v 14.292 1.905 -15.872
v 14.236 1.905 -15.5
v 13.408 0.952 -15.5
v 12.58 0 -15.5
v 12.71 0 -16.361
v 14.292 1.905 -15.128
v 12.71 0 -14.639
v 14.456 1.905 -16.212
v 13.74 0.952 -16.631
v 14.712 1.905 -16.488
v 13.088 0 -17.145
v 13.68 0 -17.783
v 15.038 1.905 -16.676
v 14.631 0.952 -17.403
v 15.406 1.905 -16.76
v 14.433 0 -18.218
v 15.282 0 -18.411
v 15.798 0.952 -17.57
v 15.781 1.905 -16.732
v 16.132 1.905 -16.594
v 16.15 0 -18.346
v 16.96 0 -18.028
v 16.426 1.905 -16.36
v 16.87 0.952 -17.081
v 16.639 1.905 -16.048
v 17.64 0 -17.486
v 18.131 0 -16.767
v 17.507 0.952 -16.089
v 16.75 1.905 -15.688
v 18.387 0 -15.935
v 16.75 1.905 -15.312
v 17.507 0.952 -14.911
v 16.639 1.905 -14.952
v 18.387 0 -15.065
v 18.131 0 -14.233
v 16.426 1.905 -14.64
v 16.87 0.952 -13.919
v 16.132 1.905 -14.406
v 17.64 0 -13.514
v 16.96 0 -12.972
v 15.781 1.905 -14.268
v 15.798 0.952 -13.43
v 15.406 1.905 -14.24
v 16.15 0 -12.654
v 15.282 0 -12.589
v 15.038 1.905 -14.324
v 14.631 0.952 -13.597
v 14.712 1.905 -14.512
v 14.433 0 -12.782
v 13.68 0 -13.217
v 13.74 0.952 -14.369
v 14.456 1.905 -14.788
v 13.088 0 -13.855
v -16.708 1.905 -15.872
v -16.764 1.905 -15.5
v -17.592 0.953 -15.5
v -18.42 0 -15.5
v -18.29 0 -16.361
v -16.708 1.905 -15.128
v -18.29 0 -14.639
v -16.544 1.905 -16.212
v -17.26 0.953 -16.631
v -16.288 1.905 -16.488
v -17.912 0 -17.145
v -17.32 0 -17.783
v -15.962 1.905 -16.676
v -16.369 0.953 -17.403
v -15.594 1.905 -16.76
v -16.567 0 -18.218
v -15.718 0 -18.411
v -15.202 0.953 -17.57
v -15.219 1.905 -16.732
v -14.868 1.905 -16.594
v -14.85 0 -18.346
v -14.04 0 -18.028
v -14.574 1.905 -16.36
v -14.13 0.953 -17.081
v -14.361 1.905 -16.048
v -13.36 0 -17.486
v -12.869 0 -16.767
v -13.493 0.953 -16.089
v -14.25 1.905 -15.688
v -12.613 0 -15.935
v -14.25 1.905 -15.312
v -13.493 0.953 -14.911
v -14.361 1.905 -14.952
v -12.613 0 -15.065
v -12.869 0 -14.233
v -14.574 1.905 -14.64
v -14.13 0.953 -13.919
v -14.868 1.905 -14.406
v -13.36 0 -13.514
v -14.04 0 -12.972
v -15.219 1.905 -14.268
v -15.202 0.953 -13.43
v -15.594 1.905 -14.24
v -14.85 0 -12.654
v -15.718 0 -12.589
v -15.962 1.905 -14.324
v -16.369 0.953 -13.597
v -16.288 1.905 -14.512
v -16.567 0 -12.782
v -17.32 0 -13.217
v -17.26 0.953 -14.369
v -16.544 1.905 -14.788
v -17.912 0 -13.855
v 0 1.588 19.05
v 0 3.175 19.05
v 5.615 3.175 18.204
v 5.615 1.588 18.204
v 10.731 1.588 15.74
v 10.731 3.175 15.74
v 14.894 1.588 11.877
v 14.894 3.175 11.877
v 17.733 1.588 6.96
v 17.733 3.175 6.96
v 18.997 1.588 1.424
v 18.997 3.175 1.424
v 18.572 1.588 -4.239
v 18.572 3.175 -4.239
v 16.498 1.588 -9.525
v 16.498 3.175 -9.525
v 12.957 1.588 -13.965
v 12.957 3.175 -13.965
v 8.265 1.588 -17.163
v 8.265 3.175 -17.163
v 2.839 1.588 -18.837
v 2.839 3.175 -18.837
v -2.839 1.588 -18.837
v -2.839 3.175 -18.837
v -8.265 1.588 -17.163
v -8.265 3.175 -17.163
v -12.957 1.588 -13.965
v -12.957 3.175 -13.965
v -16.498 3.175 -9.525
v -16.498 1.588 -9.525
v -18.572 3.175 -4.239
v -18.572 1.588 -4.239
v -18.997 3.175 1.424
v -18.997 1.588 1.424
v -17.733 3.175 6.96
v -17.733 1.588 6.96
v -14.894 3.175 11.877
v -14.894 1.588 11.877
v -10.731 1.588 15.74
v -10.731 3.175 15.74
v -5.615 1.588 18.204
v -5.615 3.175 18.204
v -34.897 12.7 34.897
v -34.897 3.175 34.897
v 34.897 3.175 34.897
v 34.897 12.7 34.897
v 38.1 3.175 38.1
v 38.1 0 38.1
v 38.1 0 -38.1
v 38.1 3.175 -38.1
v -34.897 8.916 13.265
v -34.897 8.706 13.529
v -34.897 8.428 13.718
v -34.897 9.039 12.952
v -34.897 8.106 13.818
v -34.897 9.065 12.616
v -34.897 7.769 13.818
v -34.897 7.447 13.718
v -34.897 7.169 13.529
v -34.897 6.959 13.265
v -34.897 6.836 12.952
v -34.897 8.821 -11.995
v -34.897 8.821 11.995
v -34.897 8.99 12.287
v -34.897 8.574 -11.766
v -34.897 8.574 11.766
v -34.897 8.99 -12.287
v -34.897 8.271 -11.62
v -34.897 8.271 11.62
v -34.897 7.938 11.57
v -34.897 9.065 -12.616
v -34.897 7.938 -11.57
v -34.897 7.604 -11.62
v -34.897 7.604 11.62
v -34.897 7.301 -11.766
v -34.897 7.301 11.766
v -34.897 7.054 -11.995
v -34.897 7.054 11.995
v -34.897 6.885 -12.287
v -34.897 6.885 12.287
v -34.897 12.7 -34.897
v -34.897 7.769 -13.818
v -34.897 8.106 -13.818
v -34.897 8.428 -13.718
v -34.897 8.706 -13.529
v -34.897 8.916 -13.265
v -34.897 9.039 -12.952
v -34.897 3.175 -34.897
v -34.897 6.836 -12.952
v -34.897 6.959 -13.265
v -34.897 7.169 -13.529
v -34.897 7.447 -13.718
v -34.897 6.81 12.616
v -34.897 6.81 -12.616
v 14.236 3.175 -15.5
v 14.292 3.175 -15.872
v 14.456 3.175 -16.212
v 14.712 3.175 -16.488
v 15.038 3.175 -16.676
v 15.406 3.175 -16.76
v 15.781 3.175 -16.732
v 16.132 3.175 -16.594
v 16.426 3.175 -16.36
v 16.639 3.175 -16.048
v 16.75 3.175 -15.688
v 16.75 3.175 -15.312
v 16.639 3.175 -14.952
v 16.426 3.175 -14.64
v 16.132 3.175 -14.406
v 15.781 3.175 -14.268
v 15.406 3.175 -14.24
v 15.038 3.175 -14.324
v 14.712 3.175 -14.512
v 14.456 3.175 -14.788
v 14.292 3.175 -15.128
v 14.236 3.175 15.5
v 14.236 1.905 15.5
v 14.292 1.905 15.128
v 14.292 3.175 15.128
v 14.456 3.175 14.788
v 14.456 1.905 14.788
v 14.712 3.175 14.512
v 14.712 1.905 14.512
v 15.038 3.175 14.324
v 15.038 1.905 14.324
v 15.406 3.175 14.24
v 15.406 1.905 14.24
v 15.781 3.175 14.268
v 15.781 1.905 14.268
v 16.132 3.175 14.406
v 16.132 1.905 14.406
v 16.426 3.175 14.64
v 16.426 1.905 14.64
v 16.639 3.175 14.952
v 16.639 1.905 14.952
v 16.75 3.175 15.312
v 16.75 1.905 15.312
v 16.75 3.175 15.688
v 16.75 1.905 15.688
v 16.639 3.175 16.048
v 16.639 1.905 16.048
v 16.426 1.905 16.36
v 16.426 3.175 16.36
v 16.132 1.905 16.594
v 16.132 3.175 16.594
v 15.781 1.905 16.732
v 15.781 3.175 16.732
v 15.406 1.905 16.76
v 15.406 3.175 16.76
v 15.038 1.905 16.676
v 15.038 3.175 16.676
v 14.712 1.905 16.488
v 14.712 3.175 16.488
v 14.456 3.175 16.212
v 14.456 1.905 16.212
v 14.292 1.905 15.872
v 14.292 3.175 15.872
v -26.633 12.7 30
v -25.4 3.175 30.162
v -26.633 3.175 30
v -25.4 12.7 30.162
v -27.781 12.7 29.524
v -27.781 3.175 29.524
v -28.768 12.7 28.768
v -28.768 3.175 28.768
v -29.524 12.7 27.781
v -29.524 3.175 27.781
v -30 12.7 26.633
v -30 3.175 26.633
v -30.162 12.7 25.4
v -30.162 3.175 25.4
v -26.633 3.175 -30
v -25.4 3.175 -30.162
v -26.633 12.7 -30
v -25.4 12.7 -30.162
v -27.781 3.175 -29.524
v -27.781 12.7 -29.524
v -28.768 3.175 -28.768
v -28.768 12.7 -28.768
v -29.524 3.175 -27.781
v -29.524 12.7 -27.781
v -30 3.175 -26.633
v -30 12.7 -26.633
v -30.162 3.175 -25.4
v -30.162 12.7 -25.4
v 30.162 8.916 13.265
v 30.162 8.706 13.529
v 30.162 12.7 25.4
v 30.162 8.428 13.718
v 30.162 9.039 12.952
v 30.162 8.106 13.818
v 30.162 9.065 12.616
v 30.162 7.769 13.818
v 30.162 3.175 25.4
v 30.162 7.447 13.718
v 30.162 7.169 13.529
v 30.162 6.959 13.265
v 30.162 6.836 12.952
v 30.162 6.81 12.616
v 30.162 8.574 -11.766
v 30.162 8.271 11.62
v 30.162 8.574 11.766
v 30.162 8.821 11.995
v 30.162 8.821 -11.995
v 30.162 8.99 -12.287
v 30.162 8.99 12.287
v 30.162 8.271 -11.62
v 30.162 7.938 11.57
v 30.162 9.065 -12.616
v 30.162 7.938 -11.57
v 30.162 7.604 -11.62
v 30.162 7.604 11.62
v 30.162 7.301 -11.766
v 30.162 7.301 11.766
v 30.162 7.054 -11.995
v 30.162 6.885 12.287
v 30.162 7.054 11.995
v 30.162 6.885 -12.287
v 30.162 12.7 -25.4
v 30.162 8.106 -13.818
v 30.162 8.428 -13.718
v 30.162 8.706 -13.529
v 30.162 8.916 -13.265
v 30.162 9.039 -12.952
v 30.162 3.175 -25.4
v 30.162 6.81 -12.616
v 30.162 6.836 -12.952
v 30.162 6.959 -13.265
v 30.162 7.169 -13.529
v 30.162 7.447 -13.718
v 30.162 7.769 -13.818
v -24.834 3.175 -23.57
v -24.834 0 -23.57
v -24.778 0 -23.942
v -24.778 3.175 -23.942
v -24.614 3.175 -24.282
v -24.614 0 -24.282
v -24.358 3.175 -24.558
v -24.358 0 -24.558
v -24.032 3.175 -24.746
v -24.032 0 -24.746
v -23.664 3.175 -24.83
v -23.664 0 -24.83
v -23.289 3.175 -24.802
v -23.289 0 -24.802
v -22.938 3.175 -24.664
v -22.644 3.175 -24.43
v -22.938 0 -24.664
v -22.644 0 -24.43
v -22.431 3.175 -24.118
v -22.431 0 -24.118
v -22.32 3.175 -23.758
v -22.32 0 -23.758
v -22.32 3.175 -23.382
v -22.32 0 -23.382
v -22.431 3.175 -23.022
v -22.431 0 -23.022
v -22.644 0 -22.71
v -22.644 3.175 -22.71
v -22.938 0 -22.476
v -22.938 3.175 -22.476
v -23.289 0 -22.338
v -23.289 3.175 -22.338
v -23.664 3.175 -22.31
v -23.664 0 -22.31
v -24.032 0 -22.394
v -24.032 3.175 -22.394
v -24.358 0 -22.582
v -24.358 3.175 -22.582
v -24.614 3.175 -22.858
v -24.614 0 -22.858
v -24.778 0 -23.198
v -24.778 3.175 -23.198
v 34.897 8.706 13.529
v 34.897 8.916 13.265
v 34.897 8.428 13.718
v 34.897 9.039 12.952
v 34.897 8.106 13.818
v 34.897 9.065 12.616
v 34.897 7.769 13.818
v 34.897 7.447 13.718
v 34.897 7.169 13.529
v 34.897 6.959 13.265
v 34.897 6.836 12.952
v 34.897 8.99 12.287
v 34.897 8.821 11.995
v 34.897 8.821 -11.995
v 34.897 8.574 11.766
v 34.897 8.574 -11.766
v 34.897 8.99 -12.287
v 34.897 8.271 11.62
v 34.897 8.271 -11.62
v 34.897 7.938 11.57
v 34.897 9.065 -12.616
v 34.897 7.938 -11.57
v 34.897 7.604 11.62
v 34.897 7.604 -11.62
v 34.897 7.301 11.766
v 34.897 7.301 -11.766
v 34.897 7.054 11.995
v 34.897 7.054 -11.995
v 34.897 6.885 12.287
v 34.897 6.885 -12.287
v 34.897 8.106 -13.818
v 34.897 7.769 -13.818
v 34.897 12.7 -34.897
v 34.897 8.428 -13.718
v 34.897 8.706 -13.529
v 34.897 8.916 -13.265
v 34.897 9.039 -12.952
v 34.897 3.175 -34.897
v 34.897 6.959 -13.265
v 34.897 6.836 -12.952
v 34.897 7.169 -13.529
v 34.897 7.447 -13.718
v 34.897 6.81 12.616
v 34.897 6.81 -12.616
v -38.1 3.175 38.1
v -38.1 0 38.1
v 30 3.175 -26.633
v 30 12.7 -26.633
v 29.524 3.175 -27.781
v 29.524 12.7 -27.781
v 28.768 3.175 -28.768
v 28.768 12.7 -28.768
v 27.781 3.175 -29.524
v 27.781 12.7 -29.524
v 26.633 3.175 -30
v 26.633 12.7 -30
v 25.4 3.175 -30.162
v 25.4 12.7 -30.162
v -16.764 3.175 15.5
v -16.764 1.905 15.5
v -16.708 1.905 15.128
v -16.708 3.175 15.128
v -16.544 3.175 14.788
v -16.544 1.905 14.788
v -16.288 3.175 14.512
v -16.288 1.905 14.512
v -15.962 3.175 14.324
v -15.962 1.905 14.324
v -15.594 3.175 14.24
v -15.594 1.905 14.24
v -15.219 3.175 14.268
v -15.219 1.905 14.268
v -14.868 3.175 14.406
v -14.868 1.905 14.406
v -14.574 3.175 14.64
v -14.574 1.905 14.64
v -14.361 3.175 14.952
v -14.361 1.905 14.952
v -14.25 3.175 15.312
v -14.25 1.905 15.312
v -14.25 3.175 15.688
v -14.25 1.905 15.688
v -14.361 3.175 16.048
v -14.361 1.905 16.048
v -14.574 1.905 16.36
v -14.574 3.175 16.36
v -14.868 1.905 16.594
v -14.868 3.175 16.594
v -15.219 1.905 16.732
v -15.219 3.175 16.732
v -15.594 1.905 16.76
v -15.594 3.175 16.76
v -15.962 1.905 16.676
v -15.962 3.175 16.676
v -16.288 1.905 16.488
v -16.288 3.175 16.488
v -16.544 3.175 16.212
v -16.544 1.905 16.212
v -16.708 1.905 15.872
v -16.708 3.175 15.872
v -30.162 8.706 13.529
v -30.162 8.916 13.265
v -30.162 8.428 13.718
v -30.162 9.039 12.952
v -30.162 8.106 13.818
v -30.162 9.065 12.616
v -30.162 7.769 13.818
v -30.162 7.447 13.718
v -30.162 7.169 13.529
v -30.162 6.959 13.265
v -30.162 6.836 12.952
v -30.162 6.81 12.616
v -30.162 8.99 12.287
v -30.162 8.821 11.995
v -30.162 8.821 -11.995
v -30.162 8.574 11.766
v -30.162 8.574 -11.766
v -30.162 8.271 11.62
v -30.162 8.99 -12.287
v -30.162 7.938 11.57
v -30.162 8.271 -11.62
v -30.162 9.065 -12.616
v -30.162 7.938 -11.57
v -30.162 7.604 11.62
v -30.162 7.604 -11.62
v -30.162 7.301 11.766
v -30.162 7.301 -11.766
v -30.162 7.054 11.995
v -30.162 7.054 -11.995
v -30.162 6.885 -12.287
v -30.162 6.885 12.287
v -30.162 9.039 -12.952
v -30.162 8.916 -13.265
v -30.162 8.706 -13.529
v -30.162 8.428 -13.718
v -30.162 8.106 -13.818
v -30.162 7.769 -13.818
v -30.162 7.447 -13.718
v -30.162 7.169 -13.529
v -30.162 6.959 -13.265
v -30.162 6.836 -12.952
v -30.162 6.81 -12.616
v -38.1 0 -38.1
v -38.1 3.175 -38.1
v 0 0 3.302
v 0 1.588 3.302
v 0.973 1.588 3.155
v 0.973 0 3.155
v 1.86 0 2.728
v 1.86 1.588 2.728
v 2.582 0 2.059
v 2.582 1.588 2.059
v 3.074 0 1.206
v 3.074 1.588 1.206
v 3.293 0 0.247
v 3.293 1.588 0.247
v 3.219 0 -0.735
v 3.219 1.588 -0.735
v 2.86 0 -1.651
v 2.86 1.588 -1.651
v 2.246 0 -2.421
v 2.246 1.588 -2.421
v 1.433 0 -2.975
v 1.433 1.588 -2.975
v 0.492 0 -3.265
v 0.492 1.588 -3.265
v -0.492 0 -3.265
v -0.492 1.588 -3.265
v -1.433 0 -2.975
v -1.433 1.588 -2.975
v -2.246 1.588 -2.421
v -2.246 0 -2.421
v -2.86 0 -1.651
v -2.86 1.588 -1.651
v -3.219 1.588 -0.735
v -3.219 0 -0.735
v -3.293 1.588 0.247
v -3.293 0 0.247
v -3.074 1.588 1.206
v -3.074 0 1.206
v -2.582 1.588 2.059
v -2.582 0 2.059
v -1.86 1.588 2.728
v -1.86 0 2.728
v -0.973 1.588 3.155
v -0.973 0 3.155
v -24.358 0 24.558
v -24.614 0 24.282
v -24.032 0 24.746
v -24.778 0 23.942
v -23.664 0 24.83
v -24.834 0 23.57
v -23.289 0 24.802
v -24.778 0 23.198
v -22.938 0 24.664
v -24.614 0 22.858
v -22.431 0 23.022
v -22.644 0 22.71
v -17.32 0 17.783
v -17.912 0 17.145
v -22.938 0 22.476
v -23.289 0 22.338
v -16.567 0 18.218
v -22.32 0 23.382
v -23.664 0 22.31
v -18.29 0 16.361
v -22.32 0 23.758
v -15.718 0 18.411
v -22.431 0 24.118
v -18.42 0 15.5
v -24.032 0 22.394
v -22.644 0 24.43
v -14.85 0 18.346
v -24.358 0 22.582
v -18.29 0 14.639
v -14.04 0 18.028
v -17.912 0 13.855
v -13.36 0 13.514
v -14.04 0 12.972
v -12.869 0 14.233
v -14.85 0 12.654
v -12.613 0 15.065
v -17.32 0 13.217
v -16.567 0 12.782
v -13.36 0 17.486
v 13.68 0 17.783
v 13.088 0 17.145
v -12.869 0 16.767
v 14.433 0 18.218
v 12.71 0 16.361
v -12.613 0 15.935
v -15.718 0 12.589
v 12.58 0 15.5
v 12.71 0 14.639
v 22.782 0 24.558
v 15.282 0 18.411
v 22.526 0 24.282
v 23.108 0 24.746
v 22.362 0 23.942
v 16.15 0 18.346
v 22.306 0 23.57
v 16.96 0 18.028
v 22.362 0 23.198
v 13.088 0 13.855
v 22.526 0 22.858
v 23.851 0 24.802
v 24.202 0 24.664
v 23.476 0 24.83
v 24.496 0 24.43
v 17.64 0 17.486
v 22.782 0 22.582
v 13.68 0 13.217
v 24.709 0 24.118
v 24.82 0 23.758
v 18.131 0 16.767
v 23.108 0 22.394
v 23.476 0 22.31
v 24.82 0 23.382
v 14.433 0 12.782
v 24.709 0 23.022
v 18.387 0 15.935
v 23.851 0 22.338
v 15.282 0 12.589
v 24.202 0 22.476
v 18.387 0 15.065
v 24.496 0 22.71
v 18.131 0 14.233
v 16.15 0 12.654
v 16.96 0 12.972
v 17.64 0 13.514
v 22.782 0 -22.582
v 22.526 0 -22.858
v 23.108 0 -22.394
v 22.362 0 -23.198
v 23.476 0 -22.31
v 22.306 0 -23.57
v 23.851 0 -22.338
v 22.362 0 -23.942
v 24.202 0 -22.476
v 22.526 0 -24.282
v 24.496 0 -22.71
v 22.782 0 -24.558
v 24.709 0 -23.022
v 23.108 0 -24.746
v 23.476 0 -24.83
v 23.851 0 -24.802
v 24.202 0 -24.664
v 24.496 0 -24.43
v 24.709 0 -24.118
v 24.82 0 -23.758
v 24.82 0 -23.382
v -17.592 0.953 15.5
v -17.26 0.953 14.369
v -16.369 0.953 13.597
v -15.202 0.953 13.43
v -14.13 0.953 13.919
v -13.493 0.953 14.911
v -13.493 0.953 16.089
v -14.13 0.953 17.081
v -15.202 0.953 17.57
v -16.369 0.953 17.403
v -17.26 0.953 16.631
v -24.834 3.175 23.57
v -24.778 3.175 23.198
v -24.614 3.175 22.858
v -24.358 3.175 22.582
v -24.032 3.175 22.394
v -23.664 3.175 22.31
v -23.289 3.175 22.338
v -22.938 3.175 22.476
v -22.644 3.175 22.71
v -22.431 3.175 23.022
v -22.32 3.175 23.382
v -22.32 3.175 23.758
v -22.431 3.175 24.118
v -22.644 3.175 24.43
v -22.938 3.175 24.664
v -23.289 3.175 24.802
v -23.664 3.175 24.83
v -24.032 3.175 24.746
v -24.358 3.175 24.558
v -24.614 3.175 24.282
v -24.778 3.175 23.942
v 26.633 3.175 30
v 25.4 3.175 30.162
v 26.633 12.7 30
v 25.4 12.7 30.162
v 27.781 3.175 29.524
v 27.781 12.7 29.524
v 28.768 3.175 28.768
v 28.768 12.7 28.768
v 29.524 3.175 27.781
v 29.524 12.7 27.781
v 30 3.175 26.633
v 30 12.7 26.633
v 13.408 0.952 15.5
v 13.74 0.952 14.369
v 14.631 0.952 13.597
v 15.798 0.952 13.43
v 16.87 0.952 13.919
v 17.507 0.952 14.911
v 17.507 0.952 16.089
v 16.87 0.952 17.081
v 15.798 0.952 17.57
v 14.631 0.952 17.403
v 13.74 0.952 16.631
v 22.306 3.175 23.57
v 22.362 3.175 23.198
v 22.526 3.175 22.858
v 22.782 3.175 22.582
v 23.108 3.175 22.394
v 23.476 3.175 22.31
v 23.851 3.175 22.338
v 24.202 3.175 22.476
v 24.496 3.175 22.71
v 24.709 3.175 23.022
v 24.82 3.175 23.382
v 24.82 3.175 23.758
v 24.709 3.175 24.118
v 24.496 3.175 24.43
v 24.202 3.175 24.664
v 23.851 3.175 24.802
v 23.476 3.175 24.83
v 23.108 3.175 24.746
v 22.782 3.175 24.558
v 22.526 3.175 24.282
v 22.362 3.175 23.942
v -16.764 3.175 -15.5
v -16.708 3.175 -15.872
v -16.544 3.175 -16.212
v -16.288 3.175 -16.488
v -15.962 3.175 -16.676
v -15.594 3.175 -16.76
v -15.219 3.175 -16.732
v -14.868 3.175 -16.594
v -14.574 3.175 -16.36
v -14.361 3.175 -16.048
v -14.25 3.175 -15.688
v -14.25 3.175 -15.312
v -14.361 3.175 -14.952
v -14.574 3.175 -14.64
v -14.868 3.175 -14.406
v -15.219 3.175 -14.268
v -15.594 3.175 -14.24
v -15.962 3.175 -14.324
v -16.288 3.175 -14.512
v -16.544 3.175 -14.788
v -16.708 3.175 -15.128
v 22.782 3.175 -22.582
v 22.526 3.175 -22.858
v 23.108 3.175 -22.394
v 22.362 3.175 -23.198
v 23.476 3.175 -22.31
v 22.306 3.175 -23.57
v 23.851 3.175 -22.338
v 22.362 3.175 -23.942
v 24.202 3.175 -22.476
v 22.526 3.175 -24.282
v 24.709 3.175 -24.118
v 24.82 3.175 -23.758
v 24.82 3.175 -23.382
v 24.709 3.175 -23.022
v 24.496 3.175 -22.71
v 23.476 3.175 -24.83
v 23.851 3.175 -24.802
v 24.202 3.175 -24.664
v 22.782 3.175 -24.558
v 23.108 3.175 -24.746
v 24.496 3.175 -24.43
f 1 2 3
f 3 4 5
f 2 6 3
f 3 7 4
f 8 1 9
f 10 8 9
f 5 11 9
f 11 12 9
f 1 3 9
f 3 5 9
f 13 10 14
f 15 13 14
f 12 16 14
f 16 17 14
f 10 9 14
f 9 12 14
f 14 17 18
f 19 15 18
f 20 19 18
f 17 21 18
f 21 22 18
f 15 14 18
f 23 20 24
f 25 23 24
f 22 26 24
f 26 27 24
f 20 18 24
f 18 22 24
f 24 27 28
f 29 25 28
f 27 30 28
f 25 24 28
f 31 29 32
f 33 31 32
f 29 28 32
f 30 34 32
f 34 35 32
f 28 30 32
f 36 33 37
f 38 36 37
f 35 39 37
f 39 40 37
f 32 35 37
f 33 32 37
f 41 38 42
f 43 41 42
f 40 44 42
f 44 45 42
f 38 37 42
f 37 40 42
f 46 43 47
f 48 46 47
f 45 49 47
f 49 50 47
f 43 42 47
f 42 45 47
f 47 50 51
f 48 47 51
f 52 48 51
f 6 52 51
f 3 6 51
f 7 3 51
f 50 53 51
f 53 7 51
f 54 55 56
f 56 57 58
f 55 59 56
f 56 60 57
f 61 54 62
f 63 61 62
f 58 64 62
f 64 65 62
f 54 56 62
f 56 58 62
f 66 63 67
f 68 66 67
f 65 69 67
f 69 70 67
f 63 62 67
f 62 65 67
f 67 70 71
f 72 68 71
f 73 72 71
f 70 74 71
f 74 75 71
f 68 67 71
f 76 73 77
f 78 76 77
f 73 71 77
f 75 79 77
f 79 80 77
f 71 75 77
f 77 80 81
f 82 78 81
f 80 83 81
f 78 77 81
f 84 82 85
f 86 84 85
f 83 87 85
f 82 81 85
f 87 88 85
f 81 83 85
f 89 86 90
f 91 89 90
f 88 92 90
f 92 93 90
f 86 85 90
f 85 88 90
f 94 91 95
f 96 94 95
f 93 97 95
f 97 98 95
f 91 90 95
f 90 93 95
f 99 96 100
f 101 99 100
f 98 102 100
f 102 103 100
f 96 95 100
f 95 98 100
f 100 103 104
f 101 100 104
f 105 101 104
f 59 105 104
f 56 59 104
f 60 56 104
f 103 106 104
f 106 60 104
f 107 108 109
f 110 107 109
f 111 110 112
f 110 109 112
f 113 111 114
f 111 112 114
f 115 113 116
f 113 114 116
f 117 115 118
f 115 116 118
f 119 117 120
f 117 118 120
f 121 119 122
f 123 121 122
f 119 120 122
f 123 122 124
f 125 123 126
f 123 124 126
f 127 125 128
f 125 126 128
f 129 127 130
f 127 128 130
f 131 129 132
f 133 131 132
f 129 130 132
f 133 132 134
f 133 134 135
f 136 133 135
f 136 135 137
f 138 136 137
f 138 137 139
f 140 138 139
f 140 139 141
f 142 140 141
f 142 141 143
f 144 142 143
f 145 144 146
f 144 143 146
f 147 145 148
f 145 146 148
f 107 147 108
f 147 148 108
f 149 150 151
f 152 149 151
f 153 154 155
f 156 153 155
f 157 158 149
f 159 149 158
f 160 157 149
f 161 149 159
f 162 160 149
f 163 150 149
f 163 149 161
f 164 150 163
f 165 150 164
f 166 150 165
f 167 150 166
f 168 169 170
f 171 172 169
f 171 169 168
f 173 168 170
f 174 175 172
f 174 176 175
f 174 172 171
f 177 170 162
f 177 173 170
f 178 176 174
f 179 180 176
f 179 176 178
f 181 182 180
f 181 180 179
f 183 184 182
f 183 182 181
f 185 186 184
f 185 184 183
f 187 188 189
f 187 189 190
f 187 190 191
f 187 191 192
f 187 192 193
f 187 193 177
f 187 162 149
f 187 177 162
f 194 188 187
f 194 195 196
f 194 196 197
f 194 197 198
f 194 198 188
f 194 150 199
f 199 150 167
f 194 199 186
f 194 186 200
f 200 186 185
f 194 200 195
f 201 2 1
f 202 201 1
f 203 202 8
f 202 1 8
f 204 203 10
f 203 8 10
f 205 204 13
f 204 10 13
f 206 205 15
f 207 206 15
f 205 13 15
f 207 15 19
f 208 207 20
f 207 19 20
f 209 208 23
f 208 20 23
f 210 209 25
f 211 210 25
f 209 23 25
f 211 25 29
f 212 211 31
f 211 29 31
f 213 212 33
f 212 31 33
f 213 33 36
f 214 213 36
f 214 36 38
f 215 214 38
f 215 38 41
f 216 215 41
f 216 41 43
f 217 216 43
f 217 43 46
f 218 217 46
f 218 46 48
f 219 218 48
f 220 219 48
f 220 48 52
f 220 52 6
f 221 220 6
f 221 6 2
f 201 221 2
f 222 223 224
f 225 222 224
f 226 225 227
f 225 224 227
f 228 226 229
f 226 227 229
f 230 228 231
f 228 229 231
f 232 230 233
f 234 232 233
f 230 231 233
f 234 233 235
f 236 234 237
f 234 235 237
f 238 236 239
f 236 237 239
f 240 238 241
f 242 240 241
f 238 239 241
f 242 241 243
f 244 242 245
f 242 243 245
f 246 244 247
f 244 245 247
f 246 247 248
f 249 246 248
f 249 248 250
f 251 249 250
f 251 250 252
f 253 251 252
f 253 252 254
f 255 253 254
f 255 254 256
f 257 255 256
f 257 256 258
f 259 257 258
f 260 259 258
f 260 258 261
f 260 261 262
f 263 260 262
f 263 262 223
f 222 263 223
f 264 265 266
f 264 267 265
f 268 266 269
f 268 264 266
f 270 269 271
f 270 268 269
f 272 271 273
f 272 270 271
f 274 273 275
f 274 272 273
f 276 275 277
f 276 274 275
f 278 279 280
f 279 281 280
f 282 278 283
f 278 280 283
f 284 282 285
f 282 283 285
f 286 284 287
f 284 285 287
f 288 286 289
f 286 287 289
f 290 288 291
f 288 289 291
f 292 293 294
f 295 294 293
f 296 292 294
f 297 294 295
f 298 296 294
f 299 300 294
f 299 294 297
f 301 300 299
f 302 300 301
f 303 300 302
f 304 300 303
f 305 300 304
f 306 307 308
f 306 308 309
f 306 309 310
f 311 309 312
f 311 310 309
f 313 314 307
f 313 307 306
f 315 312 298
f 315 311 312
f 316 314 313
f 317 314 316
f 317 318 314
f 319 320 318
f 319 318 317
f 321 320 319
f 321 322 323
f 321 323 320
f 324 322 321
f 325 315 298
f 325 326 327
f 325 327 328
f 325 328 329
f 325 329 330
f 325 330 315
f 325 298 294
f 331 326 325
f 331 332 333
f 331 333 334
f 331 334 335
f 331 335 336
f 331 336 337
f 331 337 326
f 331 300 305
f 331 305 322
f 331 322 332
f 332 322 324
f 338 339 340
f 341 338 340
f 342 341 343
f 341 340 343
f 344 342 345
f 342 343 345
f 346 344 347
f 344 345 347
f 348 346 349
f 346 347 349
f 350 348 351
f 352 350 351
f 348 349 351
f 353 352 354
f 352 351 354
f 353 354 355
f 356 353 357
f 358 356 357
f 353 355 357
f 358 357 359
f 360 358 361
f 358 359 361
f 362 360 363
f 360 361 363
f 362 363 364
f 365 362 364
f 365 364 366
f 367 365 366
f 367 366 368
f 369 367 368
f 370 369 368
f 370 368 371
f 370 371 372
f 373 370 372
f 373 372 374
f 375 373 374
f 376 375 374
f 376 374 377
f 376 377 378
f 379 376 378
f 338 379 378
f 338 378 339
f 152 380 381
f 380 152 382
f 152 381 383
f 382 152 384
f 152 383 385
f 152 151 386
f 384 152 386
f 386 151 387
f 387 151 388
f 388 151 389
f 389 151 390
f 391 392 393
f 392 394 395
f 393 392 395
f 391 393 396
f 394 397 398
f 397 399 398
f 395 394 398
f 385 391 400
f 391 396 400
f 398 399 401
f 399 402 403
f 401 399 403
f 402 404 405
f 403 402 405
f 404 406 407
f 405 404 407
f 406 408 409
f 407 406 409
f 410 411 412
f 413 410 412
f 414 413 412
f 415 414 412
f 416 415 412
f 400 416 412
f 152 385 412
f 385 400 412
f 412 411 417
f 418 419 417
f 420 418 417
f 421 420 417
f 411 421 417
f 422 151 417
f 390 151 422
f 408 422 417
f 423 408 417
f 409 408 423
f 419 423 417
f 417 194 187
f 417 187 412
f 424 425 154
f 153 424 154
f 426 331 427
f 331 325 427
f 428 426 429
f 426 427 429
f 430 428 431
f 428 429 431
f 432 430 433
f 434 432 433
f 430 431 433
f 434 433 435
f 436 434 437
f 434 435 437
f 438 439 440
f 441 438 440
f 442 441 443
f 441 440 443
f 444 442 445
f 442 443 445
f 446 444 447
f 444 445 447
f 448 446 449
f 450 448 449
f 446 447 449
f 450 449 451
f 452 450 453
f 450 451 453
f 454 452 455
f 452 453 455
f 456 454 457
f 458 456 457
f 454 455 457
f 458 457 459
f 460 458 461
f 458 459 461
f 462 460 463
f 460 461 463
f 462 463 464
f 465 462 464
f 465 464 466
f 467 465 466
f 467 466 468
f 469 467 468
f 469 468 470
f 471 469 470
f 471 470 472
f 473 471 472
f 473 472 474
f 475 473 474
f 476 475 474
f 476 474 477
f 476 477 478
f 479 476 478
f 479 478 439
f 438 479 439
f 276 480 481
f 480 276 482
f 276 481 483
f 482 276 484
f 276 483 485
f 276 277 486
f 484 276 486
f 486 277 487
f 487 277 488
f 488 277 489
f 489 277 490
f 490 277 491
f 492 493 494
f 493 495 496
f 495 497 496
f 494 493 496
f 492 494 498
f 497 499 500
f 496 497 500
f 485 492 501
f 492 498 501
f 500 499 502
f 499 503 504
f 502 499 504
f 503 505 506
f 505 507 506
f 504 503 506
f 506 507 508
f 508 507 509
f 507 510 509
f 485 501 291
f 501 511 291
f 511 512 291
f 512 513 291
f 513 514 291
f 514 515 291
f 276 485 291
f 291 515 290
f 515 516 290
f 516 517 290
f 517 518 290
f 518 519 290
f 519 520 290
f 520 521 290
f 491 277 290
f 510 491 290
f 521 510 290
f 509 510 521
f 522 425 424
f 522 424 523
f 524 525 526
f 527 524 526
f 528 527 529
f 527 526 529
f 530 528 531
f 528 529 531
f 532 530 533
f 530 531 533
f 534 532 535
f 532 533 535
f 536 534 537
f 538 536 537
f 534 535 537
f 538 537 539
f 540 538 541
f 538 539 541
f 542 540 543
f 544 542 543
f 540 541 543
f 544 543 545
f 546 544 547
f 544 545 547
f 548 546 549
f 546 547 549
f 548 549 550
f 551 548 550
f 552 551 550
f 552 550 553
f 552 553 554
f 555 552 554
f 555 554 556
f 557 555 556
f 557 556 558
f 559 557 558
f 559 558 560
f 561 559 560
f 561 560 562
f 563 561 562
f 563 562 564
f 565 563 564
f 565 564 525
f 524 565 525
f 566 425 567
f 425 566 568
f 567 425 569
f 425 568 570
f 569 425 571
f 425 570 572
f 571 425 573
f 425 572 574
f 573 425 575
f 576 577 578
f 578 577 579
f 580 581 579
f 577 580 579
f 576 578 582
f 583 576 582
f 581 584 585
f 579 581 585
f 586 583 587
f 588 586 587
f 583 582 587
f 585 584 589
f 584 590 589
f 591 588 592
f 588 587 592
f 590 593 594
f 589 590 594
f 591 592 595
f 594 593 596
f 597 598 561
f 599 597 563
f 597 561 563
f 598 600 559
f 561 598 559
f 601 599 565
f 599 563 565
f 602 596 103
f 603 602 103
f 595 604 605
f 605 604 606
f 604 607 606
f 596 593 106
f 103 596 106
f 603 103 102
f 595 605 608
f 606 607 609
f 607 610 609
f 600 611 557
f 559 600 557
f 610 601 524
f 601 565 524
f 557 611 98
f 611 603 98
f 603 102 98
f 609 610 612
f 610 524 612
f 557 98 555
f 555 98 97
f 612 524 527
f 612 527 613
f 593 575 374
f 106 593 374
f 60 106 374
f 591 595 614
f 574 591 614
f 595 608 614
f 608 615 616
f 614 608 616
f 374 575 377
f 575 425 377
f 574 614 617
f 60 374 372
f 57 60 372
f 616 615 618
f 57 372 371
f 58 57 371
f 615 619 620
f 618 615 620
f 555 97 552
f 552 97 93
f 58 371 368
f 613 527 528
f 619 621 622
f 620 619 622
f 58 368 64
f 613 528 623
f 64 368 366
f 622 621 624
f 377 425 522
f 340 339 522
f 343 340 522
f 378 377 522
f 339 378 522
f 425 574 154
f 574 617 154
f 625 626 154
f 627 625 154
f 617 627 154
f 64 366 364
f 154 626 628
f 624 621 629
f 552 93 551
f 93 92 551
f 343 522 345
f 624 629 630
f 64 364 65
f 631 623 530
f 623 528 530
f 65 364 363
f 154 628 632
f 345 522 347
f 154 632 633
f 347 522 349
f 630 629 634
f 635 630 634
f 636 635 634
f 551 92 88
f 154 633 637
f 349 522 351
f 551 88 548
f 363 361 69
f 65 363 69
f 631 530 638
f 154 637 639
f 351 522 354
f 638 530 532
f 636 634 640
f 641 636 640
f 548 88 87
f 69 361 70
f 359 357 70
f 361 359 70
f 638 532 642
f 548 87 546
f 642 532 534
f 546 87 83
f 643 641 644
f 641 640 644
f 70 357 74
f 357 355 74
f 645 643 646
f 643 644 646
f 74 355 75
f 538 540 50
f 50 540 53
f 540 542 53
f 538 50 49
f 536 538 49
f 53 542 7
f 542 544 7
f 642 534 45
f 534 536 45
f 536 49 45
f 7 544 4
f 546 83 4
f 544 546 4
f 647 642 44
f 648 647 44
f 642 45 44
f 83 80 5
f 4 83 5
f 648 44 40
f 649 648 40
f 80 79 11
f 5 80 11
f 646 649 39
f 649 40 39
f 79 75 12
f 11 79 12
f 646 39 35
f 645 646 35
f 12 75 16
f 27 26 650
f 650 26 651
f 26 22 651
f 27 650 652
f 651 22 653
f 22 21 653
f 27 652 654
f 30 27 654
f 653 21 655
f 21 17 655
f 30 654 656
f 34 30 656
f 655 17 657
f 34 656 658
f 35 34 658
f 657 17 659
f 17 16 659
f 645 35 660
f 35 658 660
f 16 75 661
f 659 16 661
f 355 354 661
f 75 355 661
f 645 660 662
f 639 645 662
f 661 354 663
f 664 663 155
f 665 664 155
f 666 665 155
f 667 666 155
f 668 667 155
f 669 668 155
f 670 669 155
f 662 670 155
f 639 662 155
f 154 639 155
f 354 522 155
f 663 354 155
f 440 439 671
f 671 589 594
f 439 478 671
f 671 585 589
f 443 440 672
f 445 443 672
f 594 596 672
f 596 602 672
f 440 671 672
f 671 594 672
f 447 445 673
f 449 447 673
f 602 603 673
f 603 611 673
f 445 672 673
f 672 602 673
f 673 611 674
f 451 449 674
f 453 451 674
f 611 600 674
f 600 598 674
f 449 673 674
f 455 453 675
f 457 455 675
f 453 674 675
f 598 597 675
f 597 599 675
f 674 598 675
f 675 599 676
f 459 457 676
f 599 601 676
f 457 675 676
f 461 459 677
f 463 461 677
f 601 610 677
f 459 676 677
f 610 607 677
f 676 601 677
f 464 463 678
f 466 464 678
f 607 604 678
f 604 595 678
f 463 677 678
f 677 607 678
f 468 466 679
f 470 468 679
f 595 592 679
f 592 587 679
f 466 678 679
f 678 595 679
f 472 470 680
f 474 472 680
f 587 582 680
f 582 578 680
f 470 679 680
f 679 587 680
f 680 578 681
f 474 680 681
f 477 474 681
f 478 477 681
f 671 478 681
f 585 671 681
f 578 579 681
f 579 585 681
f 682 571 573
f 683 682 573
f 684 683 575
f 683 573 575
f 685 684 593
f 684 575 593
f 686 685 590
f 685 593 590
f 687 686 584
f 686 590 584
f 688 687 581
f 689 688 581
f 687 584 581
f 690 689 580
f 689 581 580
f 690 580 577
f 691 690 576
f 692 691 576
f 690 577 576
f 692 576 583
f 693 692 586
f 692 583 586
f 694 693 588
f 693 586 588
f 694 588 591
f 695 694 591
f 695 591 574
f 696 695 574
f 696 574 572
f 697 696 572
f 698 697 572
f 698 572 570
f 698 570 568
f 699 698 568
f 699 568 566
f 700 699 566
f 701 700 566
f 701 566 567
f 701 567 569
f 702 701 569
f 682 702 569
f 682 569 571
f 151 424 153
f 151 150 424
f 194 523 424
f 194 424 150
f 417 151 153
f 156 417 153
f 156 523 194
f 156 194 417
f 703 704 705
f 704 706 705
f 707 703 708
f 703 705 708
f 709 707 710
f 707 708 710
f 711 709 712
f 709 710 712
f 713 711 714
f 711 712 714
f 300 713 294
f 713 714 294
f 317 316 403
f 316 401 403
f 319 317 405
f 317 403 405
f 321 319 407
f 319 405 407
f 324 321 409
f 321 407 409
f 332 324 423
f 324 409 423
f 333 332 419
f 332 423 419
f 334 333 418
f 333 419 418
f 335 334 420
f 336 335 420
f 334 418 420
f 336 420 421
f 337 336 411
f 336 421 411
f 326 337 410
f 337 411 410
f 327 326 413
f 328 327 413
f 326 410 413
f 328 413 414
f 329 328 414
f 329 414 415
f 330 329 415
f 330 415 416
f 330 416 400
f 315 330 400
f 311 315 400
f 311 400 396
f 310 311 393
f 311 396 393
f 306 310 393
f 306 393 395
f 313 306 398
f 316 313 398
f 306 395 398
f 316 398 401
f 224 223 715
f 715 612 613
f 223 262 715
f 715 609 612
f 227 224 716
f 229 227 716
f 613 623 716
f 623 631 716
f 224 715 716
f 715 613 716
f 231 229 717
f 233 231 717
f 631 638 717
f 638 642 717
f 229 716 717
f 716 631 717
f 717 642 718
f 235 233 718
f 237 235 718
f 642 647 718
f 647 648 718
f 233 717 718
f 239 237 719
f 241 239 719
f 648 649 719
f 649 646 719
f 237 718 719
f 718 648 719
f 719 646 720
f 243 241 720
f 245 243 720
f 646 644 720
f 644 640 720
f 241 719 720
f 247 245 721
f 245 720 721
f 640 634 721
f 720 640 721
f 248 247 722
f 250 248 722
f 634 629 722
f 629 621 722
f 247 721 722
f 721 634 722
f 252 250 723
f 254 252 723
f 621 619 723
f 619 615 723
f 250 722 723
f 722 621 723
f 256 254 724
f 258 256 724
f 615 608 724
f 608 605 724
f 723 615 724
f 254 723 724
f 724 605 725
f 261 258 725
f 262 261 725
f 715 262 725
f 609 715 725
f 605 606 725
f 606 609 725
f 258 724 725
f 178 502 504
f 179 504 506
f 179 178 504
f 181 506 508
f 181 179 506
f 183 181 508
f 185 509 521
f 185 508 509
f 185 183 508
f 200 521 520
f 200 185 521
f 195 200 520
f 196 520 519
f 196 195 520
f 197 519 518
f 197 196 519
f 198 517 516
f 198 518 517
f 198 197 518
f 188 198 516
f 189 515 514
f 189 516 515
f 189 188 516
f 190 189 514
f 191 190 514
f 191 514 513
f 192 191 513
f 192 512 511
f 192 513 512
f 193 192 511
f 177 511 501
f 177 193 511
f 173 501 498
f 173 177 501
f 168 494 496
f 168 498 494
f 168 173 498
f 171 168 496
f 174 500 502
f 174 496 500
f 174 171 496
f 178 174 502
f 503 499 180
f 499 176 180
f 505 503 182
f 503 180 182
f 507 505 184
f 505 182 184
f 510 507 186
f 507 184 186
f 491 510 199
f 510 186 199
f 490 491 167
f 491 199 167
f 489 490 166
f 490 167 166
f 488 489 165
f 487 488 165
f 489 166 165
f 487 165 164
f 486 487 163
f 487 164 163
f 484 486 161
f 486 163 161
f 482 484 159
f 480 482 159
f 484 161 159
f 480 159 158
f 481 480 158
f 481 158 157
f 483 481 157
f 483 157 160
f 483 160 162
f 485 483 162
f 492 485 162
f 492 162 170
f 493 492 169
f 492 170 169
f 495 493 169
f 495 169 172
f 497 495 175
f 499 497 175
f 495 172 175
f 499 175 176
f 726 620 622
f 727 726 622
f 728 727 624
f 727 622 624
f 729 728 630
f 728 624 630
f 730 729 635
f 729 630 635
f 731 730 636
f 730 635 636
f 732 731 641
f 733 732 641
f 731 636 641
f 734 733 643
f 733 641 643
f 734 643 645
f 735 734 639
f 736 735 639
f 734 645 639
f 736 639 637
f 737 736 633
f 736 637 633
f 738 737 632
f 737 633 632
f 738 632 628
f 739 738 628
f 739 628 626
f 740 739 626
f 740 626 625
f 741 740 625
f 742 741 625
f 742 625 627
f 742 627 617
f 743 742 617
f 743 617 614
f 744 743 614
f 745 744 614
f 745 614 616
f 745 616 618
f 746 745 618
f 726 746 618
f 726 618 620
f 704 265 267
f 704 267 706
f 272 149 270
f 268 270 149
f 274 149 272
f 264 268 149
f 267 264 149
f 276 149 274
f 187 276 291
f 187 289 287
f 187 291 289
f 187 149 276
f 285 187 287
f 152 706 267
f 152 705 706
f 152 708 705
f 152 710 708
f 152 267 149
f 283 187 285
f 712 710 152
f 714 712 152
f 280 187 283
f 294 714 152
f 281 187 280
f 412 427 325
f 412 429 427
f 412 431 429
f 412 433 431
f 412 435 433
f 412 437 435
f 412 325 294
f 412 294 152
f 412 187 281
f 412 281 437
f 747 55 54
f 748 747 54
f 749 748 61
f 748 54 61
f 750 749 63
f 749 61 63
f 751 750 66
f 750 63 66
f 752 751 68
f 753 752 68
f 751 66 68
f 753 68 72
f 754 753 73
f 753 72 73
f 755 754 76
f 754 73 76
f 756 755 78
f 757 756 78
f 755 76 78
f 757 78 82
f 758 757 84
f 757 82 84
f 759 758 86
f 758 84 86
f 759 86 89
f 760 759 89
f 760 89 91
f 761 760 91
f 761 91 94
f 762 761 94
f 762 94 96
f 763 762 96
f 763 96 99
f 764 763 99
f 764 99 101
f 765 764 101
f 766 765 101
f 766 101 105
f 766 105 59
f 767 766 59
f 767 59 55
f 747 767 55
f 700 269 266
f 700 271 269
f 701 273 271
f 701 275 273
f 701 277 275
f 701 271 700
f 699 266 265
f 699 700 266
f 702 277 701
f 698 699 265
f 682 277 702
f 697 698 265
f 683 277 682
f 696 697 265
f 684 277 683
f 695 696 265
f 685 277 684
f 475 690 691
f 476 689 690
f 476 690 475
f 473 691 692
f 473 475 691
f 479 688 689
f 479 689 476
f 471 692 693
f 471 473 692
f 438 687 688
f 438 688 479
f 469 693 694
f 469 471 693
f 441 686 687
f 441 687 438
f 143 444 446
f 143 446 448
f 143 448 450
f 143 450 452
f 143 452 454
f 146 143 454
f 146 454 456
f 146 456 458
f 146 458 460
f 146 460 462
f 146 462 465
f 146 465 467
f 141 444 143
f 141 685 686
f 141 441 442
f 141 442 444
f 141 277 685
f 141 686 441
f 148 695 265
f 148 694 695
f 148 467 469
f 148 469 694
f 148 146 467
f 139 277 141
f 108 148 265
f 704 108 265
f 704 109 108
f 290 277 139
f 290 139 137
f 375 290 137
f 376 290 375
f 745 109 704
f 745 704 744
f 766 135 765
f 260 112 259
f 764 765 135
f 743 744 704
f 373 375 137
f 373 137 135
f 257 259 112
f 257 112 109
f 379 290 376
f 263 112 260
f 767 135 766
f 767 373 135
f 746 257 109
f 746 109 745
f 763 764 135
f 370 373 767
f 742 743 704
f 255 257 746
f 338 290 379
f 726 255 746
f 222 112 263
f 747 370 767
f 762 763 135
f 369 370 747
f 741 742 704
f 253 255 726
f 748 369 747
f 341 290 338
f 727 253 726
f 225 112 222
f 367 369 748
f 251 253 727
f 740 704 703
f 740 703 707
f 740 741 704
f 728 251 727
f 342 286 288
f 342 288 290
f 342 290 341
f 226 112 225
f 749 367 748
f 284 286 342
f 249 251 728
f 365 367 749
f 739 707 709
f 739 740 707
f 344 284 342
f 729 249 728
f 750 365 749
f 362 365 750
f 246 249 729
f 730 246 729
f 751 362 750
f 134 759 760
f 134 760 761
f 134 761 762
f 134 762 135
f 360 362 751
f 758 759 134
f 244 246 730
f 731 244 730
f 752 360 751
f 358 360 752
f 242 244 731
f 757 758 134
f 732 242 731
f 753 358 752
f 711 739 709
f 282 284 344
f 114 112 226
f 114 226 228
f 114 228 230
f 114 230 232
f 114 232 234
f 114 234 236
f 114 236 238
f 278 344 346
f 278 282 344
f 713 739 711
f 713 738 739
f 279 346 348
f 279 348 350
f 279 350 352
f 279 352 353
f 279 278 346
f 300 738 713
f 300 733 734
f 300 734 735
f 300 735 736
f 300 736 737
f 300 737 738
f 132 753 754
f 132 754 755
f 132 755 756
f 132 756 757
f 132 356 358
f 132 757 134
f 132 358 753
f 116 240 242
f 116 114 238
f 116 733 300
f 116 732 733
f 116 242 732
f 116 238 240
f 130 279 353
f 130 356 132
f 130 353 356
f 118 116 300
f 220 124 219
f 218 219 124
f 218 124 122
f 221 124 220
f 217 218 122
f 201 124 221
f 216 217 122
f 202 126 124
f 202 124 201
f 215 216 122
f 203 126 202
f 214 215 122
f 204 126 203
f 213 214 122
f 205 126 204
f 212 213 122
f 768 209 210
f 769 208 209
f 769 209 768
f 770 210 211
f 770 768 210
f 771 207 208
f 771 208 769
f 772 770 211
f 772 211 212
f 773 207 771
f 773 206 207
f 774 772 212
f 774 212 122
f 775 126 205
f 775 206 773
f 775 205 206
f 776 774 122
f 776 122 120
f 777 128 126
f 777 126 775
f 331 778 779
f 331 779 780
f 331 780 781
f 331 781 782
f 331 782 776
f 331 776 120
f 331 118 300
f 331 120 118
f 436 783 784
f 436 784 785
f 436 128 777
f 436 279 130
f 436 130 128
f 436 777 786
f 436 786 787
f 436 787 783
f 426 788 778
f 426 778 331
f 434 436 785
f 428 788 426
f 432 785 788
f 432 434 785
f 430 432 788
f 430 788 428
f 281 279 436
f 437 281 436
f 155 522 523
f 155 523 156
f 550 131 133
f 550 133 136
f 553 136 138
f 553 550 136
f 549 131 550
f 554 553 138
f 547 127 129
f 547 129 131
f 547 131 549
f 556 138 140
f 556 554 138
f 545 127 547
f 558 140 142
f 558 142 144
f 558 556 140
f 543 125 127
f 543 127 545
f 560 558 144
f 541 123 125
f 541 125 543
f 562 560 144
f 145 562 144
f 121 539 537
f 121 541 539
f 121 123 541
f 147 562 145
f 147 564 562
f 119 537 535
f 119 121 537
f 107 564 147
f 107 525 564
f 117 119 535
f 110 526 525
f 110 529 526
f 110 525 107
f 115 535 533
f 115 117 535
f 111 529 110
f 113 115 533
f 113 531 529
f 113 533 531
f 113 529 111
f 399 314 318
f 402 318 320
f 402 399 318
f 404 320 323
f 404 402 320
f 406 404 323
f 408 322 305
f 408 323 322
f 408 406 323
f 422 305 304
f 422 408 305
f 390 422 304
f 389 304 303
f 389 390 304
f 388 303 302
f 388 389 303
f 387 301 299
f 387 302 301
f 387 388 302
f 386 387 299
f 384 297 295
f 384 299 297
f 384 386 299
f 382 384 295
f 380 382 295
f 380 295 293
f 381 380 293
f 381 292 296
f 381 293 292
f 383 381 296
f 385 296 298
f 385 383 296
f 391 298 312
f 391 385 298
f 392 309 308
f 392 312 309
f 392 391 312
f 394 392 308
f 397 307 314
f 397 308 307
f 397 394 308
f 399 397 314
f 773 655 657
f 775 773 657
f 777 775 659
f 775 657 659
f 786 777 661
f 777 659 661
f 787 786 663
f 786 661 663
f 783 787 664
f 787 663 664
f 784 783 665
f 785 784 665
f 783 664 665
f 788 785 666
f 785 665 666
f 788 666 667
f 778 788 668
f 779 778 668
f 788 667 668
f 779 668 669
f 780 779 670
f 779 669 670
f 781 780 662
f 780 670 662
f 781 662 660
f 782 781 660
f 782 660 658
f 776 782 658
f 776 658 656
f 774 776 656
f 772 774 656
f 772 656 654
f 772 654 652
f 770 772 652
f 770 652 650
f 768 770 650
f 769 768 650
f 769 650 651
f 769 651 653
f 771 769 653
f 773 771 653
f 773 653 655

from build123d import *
from OCP.BRepFilletAPI import BRepFilletAPI_MakeChamfer

# Parameters (mm, degrees)
SKETCH1_W                    = 76.2
SKETCH1_H                    = 76.2
BOSS_EXTRUDE1_DEPTH          = 3.175
SKETCH2_W                    = 69.79412
SKETCH2_H                    = 69.79412
SKETCH2_W_2                  = 60.325
SKETCH2_H_2                  = 60.325
BOSS_EXTRUDE2_DEPTH          = 9.525
FILLET1_R                    = 4.7625
SKETCH3_R                    = 19.05
CUT_EXTRUDE1_DEPTH           = 1.5875
SKETCH4_R                    = 3.302
CUT_EXTRUDE2_DEPTH           = 56.015521957
F_39_0_0995_DIAMETER_HOLE1_D = 2.5273
CHAMFER1_SIZE                = 1.905
CHAMFER1_SIZE2               = 1.655991236


with BuildPart() as part:
    # Sketch1 → Boss-Extrude1 (new body)
    with BuildSketch(Plane(origin=(0, 0, 0), x_dir=(1, 0, 0), z_dir=(0, 1, 0))):
        Rectangle(SKETCH1_W, SKETCH1_H)
    extrude(amount=BOSS_EXTRUDE1_DEPTH)

    # Sketch2 → Boss-Extrude2 (add)
    with BuildSketch(Plane(origin=(0, 3.175, 0), x_dir=(1, 0, 0), z_dir=(0, 1, 0))):
        Rectangle(SKETCH2_W, SKETCH2_H)
        Rectangle(SKETCH2_W_2, SKETCH2_H_2, mode=Mode.SUBTRACT)
    extrude(amount=BOSS_EXTRUDE2_DEPTH)

    # Fillet1
    fillet1_edges = [part.edges().sort_by_distance(p)[0] for p in [
        (-30.1625, 7.9375, 30.1625),
        (30.1625, 7.9375, 30.1625),
        (30.1625, 7.9375, -30.1625),
        (-30.1625, 7.9375, -30.1625),
    ]]
    fillet(fillet1_edges, radius=FILLET1_R)

    # Sketch3 → Cut-Extrude1 (cut)
    with BuildSketch(Plane(origin=(0, 3.175, 0), x_dir=(1, 0, 0), z_dir=(0, 1, 0))):
        with Locations(Location((0, 0, 0), (0, 0, 270))):
            Circle(SKETCH3_R)
    extrude(amount=-CUT_EXTRUDE1_DEPTH, mode=Mode.SUBTRACT)

    # Sketch4 → Cut-Extrude2 (cut, through all)
    with BuildSketch(Plane(origin=(0, 1.5875, 0), x_dir=(1, 0, 0), z_dir=(0, 1, 0))):
        with Locations(Location((0, 0, 0), (0, 0, 270))):
            Circle(SKETCH4_R)
    extrude(amount=-CUT_EXTRUDE2_DEPTH, mode=Mode.SUBTRACT)

    # #39 (0.0995) Diameter Hole1 (through all)
    with Locations(Plane(origin=(0, 3.175, 0), x_dir=(1, 0, 0), z_dir=(0, 1, 0))):
        with Locations((15.5, 15.5), (-15.5, 15.5), (-15.5, -15.5), (15.5, -15.5), (-23.57, 23.57), (23.57, 23.57), (23.57, -23.57), (-23.57, -23.57)):
            Hole(F_39_0_0995_DIAMETER_HOLE1_D / 2)

    # Sketch9 → #4-40 Tapped Hole1 (revolve, cut)
    with BuildSketch(Plane(origin=(34.89706, 7.9375, 12.7), x_dir=(0, 0, -1), z_dir=(0, 1, 0))):
        Polygon((0, 0), (0, 7.283152758), (1.1303, 6.604), (1.1303, 0), align=None)
    f_4_40_tapped_hole1 = revolve(axis=Axis((41.24706, 7.9375, 12.7), (-1, 0, 0)), mode=Mode.SUBTRACT)

    # Mirror1: #4-40 Tapped Hole1 across plane
    add(f_4_40_tapped_hole1.mirror(Plane.XY), mode=Mode.SUBTRACT)

    # Mirror2: #4-40 Tapped Hole1 across plane
    add(f_4_40_tapped_hole1.mirror(Plane(origin=(0, 0, 0), x_dir=(0, 0, 1), z_dir=(1, 0, 0))), mode=Mode.SUBTRACT)

    # Mirror2 copy 1 sketch → Mirror2 copy 1 (revolve, cut)
    with BuildSketch(Plane(origin=(-34.89706, 7.9375, -12.7), x_dir=(0, 0, 1), z_dir=(0, 1, 0))):
        Polygon((0, 0), (0, 7.283152758), (1.1303, 6.604), (1.1303, 0), align=None)
    revolve(axis=Axis((-41.24706, 7.9375, -12.7), (1, 0, 0)), mode=Mode.SUBTRACT)

    # Chamfer1: one chamfer whose edges measure the first distance from different faces: ONE call of the kernel's chamfer builder (chamfer() names one face for all edges)
    chamfer1_edges_1 = [part.edges().sort_by_distance(p)[0] for p in [
        (16.76365, 0, 15.5),
    ]]
    chamfer1_side_1 = [part.faces().sort_by_distance(p)[0] for p in [
        (16.76365, 1.5875, 15.5),
    ]]
    chamfer1_edges_2 = [part.edges().sort_by_distance(p)[0] for p in [
        (-14.23635, 0, 15.5),
    ]]
    chamfer1_side_2 = [part.faces().sort_by_distance(p)[0] for p in [
        (-14.23635, 1.5875, 15.5),
    ]]
    chamfer1_edges_3 = [part.edges().sort_by_distance(p)[0] for p in [
        (-14.23635, 0, -15.5),
    ]]
    chamfer1_side_3 = [part.faces().sort_by_distance(p)[0] for p in [
        (-14.23635, 1.5875, -15.5),
    ]]
    chamfer1_edges_4 = [part.edges().sort_by_distance(p)[0] for p in [
        (16.76365, 0, -15.5),
    ]]
    chamfer1_side_4 = [part.faces().sort_by_distance(p)[0] for p in [
        (16.76365, 1.5875, -15.5),
    ]]
    chamfer1 = BRepFilletAPI_MakeChamfer(part.part.solid().wrapped)
    for e in chamfer1_edges_1:
        chamfer1.Add(CHAMFER1_SIZE, CHAMFER1_SIZE2, e.wrapped, chamfer1_side_1[0].wrapped)  # the first distance lies on this face
    for e in chamfer1_edges_2:
        chamfer1.Add(CHAMFER1_SIZE, CHAMFER1_SIZE2, e.wrapped, chamfer1_side_2[0].wrapped)  # the first distance lies on this face
    for e in chamfer1_edges_3:
        chamfer1.Add(CHAMFER1_SIZE, CHAMFER1_SIZE2, e.wrapped, chamfer1_side_3[0].wrapped)  # the first distance lies on this face
    for e in chamfer1_edges_4:
        chamfer1.Add(CHAMFER1_SIZE, CHAMFER1_SIZE2, e.wrapped, chamfer1_side_4[0].wrapped)  # the first distance lies on this face
    add(Compound.cast(chamfer1.Shape()), mode=Mode.REPLACE)


solid = part.part
